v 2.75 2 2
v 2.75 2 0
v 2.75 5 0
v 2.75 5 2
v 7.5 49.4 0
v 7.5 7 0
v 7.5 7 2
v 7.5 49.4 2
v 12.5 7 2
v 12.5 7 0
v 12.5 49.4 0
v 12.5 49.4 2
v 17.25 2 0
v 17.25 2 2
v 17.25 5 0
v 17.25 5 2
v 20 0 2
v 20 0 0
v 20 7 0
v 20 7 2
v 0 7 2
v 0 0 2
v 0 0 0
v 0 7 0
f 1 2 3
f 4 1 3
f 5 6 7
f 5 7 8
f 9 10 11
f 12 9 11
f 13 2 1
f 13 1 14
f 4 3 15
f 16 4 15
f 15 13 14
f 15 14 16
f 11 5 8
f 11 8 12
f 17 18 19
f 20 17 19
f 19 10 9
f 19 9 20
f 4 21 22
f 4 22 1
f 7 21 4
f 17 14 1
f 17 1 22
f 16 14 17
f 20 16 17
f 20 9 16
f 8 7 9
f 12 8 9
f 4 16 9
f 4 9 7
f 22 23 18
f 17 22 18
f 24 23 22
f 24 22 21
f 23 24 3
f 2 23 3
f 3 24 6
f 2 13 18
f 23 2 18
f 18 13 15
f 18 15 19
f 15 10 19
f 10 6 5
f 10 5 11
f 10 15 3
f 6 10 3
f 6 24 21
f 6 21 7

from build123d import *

# Parameters (mm, degrees)
BOX002_W     = 5
BOX002_H     = 42.400002
BOX002_DEPTH = 2
BOX001_W     = 14.5
BOX001_H     = 3
BOX001_DEPTH = 2
BOX_W        = 20
BOX_H        = 7
BOX_DEPTH    = 2


with BuildPart() as box002:
    # Box002 → Box002 (new body)
    with BuildSketch(Plane(origin=(7.5, 7, 0), x_dir=(1, 0, 0), z_dir=(0, 0, 1))):
        with Locations((2.5, 21.200001)):
            Rectangle(BOX002_W, BOX002_H)
    extrude(amount=BOX002_DEPTH)


with BuildPart() as box001:
    # Box001 → Box001 (new body)
    with BuildSketch(Plane(origin=(2.75, 2, 0), x_dir=(1, 0, 0), z_dir=(0, 0, 1))):
        with Locations((7.25, 1.5)):
            Rectangle(BOX001_W, BOX001_H)
    extrude(amount=BOX001_DEPTH)


with BuildPart() as fusion:
    # Box → Box (new body)
    with BuildSketch(Plane.XY):
        with Locations((10, 3.5)):
            Rectangle(BOX_W, BOX_H)
    extrude(amount=BOX_DEPTH)

    # Cut: cut Box001
    add(box001.part, mode=Mode.SUBTRACT)

    # Fusion: union Box002
    add(box002.part)


solid = fusion.part
